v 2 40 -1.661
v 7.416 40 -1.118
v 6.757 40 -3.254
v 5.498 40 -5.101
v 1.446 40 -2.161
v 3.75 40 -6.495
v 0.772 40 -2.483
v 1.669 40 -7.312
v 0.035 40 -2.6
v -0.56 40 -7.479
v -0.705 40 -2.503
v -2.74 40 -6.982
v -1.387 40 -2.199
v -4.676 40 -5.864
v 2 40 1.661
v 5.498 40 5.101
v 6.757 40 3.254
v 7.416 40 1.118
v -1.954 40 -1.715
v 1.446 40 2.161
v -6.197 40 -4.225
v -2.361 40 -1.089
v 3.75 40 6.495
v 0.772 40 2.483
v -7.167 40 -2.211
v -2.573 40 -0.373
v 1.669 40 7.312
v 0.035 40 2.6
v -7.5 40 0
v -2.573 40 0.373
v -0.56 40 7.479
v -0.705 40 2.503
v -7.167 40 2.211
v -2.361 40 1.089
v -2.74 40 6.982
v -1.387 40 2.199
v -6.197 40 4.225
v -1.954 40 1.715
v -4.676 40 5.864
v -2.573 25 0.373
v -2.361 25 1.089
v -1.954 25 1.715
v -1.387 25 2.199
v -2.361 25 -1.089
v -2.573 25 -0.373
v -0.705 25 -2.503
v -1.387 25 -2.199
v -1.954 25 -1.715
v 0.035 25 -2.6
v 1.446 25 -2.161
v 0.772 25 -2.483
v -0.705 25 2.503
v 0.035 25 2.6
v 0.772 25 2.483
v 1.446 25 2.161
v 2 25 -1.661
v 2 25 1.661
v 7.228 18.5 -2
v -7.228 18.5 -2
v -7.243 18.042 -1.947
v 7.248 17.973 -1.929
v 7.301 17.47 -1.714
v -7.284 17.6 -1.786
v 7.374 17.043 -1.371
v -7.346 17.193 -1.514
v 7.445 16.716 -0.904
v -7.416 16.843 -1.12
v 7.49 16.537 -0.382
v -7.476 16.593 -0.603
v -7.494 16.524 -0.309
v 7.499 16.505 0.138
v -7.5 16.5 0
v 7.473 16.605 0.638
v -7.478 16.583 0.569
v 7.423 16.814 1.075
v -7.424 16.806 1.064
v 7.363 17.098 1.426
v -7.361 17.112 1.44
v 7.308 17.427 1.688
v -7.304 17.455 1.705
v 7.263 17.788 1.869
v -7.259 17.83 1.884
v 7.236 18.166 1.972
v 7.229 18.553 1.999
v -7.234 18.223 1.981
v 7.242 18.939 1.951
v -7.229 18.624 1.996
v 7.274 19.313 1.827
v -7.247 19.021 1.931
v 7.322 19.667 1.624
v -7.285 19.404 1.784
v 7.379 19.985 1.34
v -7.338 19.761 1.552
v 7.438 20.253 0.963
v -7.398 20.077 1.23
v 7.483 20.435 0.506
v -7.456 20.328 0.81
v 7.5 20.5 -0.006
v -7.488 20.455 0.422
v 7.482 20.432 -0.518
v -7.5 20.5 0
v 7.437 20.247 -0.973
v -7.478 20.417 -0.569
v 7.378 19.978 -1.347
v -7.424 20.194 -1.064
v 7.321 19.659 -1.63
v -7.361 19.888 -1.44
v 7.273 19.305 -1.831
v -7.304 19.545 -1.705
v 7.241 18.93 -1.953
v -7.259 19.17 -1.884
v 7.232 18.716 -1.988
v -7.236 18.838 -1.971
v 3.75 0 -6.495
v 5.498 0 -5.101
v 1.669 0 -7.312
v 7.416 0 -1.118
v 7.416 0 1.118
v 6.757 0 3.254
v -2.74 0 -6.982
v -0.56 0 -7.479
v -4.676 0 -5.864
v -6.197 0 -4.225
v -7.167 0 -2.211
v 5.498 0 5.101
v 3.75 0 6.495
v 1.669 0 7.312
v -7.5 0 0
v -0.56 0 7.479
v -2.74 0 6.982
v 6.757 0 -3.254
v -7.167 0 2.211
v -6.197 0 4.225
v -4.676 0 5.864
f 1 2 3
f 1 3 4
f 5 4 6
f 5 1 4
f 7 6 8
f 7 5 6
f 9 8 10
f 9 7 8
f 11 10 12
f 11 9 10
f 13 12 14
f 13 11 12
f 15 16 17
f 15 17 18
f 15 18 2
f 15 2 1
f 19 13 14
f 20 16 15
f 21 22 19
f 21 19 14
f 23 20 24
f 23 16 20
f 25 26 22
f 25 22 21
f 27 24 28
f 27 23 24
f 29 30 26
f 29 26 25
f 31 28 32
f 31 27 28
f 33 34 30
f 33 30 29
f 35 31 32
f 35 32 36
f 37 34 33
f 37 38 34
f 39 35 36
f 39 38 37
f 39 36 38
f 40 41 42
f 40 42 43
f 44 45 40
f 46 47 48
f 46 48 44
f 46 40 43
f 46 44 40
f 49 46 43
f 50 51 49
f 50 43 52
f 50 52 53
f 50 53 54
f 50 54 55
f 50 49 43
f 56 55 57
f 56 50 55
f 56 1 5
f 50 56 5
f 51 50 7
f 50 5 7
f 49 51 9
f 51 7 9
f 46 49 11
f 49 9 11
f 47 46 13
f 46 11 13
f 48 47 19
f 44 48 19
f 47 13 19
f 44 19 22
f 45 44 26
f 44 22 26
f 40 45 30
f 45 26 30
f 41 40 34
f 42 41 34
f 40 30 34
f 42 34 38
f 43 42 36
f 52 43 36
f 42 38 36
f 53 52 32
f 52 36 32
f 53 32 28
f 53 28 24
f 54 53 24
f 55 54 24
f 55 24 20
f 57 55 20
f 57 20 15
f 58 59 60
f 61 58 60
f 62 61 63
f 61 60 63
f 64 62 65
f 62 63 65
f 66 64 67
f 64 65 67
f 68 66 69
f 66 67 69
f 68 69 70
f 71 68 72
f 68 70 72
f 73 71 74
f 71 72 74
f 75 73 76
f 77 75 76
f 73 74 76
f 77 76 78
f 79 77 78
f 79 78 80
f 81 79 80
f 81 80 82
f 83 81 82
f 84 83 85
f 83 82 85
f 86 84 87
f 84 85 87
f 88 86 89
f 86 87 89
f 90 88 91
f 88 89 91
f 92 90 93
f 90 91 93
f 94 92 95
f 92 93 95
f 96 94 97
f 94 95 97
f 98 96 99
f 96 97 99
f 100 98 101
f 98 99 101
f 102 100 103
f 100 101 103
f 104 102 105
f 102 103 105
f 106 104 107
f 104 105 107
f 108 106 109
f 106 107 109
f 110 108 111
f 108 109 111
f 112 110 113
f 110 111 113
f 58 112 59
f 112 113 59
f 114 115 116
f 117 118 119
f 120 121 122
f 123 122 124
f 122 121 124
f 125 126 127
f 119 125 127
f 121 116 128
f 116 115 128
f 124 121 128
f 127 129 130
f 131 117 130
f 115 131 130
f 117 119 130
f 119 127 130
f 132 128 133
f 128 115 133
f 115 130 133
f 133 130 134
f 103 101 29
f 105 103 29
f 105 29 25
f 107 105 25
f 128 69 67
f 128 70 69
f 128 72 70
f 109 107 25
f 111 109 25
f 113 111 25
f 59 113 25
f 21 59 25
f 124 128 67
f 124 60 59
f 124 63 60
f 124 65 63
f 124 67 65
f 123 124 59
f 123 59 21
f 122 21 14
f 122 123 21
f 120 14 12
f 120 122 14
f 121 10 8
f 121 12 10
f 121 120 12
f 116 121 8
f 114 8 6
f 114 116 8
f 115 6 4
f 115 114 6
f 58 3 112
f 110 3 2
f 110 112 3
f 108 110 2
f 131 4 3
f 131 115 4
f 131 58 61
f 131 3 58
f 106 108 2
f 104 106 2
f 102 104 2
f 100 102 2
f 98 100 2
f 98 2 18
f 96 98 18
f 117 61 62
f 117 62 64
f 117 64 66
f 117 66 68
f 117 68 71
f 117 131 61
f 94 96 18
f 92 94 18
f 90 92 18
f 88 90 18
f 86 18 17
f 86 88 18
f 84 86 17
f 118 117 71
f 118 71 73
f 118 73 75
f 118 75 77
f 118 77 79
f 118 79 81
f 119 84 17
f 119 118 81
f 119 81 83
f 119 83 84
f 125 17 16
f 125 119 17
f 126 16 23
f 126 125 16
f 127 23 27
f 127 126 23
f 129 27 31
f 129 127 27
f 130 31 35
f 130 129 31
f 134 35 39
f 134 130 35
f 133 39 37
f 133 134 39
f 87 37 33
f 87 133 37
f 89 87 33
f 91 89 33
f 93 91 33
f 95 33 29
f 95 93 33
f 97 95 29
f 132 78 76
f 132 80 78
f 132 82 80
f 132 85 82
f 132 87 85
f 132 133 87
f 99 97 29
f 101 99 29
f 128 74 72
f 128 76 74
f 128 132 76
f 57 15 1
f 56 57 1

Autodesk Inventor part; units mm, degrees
ref_plane "YZ Plane" through (0, 0, 0) normal (1, 0, 0) x (0, 1, 0)
ref_plane "XZ Plane" through (0, 0, 0) normal (0, 1, 0) x (-1, 0, 0)
ref_plane "XY Plane" through (0, 0, 0) normal (0, 0, 1) x (1, 0, 0)
sketch "Skizze1" plane through (0, 0, 0) normal (0, 1, 0) x (-1, 0, 0)
  circle A0 centre (0, 0) radius 7.5
  dimension "d0" = 15
extrude "Extrusion1" add sketch "Skizze1" along normal blind 40
sketch "Skizze2" plane through (0, 40, 0) normal (0, 1, 0) x (1, 0, 0)
  arc A0 (2, 1.6613) -> (2, -1.6613) centre (0, 0) ccw
  line L0 (2, -1.6613) -> (2, 1.6613)
  dimension "d3" = 5.2
  dimension "d4" = 4.6
extrude "Extrusion2" cut sketch "Skizze2" against normal blind 15
sketch "Skizze3" plane through (0, 0, 0) normal (1, 0, 0) x (0, 1, 0)
  line L0 (-8, 0) -> (48, 0) construction
  line L1 (40, -7.5) -> (40, 7.5) projected
  line L2 (0, 7.5) -> (0, -7.5) projected
  point P0 (0, 0)
  point P1 (18.5, 0)
  dimension "d7" = 21.5
hole "Bohrung1" at (0, 18.5, 0) direction (-1, 0, 0) diameter 4 end through all both
properties part number "Motor_Spiral"
